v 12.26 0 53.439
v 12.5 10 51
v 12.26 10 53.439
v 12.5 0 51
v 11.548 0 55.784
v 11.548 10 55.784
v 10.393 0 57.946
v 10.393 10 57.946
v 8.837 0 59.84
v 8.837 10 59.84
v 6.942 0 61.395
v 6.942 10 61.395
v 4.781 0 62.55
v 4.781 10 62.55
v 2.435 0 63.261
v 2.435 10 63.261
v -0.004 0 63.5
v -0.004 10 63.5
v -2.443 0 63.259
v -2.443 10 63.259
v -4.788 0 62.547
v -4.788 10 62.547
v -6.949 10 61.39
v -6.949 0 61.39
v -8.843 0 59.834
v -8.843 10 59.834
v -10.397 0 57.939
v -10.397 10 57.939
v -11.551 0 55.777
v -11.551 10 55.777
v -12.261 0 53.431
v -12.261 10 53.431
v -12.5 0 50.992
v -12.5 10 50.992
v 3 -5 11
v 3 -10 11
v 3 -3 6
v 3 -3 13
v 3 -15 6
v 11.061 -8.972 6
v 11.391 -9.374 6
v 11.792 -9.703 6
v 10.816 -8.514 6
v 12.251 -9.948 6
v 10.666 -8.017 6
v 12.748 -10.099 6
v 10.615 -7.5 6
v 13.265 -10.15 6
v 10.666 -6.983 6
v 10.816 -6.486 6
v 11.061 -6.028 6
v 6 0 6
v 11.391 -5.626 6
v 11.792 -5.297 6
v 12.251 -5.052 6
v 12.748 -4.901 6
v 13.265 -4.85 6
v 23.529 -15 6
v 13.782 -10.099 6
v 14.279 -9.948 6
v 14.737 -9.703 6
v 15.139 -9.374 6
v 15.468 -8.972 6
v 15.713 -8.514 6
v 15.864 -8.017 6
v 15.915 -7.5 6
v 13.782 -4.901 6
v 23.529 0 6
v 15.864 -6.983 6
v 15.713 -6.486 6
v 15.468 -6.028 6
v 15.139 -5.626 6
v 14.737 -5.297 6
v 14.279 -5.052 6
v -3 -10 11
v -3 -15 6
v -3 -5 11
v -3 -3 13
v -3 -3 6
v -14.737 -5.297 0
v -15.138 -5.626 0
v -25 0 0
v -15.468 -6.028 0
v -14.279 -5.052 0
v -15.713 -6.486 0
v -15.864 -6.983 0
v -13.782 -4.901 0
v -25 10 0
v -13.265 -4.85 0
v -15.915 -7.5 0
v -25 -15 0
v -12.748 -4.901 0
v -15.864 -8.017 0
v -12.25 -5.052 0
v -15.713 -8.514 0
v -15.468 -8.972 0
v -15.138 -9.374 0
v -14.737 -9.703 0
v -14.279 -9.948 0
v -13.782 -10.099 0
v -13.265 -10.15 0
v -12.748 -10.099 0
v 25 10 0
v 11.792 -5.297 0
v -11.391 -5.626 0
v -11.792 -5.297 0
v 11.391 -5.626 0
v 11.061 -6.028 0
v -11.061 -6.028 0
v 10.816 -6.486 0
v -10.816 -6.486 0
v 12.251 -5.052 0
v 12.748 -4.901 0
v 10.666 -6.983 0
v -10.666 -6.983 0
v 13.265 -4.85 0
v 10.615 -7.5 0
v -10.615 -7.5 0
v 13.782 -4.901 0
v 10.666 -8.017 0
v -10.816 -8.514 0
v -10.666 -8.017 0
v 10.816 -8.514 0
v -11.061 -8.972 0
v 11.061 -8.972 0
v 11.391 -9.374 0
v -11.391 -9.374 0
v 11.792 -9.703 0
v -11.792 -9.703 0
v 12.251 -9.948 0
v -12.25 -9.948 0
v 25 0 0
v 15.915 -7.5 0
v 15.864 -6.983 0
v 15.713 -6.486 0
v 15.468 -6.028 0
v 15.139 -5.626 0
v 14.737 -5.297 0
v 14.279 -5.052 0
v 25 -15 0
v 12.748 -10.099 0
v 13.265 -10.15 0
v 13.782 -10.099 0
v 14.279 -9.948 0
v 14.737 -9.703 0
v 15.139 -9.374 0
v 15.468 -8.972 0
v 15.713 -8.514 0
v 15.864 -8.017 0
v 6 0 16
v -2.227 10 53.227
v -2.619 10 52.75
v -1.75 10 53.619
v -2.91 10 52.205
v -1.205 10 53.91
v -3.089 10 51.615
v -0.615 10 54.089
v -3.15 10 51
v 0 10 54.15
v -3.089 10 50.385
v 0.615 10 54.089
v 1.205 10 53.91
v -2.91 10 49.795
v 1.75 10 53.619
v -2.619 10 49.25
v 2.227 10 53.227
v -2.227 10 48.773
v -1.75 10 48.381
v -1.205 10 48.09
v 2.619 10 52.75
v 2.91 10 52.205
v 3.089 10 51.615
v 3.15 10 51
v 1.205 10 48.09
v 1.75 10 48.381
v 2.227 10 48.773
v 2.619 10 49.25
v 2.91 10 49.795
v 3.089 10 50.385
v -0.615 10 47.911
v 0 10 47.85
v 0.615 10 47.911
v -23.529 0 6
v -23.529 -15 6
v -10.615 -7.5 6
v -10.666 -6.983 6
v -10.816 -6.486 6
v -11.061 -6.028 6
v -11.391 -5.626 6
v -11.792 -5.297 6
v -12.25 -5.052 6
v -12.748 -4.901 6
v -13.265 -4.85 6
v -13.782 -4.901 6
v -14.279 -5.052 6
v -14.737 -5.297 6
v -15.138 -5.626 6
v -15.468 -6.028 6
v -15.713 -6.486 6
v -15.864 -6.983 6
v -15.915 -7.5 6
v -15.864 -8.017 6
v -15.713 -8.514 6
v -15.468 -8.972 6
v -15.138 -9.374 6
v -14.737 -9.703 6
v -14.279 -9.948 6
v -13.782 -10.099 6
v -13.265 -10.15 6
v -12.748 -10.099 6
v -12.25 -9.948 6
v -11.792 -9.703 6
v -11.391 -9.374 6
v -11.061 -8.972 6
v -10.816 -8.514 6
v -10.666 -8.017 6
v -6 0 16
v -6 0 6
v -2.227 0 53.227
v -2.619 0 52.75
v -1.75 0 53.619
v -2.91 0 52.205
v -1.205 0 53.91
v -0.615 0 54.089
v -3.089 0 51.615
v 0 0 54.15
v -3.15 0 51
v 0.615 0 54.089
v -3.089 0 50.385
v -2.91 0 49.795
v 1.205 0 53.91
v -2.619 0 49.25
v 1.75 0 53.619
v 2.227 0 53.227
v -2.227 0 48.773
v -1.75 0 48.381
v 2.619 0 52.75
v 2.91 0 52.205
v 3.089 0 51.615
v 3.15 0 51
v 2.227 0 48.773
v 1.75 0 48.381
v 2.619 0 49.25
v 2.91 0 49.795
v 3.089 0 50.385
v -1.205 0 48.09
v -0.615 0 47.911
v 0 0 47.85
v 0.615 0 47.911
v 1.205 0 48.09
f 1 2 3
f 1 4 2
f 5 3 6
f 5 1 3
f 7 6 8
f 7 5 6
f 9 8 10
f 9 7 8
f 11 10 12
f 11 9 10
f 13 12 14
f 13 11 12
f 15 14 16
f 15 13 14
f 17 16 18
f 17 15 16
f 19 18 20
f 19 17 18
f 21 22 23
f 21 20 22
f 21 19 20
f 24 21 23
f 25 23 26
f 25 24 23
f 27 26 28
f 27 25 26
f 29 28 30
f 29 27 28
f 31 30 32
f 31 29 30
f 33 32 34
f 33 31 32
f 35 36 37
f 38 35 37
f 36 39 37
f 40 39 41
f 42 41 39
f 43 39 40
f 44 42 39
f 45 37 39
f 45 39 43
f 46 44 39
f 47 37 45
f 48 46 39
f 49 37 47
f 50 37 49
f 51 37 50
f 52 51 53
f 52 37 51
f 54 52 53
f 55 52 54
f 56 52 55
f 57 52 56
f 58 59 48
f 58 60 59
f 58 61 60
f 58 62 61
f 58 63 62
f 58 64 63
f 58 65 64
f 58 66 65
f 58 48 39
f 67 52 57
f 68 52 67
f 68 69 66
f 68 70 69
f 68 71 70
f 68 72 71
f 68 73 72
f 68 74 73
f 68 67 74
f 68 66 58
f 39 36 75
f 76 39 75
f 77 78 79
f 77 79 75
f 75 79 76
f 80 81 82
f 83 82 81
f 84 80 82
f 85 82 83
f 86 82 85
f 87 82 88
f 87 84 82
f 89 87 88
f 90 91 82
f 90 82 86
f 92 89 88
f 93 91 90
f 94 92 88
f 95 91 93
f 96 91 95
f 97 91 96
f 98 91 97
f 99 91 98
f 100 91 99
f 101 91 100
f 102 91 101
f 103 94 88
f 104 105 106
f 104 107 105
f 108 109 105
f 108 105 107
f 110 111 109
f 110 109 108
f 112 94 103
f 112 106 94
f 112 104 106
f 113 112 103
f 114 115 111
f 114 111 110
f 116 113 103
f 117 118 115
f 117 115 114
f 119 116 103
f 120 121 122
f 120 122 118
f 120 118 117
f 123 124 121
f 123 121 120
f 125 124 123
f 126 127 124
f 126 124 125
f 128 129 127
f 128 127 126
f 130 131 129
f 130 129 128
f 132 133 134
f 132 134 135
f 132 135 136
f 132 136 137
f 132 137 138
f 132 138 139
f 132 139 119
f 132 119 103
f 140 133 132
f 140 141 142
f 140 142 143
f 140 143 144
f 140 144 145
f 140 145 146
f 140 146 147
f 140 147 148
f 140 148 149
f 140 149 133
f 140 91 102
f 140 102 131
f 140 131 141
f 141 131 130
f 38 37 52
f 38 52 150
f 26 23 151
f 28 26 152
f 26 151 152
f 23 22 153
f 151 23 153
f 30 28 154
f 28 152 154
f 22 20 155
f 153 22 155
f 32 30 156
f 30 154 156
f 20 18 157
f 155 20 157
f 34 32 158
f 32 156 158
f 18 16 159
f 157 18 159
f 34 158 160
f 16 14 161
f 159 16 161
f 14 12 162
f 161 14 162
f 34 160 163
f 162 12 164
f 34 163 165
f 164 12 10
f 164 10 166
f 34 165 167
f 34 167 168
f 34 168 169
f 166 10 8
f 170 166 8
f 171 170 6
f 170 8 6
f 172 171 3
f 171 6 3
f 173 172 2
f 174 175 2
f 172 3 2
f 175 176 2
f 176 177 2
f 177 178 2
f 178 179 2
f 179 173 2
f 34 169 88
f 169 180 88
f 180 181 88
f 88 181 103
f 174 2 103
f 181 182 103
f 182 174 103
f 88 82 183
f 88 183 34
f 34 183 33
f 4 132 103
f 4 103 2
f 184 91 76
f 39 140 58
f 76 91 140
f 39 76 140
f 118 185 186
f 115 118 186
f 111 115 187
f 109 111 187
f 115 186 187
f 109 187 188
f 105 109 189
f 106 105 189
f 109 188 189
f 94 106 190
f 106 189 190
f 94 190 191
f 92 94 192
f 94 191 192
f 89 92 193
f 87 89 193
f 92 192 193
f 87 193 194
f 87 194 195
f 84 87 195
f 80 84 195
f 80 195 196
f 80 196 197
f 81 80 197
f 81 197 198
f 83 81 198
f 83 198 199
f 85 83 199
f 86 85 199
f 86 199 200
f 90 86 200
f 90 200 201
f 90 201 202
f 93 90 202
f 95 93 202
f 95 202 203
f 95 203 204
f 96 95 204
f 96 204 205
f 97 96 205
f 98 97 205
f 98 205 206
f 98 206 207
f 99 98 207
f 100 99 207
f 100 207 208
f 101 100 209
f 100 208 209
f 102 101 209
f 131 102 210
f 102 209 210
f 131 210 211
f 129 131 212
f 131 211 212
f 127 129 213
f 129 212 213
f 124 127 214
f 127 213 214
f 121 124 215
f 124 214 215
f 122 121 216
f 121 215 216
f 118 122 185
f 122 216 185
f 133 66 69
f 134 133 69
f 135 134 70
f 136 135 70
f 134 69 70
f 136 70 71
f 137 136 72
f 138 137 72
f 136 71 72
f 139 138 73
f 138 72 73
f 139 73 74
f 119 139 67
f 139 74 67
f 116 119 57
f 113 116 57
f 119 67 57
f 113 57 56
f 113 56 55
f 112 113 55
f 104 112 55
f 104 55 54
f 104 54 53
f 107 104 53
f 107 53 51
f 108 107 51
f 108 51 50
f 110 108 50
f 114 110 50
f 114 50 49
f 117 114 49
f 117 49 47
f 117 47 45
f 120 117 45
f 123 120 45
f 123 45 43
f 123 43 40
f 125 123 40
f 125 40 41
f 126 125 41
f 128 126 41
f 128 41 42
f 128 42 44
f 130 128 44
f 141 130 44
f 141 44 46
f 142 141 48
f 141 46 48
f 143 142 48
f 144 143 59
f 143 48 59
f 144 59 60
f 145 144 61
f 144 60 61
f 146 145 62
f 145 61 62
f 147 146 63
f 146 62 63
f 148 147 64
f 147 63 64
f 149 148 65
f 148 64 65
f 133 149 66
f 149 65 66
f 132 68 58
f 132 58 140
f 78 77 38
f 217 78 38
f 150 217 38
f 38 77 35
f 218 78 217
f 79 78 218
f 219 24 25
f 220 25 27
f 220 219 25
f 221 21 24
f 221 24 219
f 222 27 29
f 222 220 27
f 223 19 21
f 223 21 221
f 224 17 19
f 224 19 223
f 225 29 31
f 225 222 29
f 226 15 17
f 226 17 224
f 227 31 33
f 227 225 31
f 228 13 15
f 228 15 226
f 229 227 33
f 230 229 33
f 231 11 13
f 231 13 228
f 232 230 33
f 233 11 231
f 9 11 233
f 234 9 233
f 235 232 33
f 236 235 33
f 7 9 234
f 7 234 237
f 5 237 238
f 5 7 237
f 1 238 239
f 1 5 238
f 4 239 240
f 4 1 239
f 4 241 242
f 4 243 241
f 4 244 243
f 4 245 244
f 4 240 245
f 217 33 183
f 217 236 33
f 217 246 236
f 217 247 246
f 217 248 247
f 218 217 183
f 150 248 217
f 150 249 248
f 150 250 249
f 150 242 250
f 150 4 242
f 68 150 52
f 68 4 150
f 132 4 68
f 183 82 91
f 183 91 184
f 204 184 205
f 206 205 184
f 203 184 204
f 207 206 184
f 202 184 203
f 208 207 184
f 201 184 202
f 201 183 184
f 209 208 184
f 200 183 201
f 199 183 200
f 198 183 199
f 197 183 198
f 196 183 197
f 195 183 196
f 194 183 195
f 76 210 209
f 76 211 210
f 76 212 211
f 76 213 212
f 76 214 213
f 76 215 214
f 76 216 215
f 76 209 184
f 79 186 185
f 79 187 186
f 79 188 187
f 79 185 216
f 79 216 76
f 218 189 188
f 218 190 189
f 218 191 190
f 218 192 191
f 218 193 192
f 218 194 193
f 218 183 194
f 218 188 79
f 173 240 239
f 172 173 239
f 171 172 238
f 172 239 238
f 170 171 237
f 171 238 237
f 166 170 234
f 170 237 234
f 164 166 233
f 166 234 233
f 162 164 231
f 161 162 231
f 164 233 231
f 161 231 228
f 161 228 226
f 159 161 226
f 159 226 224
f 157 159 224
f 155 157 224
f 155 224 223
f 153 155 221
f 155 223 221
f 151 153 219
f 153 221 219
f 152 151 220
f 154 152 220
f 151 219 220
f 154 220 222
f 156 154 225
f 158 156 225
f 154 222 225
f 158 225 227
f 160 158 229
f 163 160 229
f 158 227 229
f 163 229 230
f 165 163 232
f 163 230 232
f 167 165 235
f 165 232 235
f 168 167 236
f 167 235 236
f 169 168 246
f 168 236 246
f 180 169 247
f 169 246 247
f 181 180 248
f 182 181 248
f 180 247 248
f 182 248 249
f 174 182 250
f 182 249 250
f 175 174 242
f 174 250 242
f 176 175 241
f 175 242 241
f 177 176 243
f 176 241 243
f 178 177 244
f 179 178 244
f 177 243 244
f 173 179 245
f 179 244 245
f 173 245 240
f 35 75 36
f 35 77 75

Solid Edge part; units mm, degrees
sketch "Sketch1" plane through (0, 0, 0) normal (0, -1, 0) x (1, 0, 0)
  circle A0 centre (0, 51) radius 3.15
  line L0 (25, 0) -> (12.5, 51)
  line L1 (0, 0) -> (25, 0)
  line L2 (0, 0) -> (-25, 0)
  line L3 (-25, 0) -> (-12.5, 50.9918)
  arc A1 (-12.5, 50.9918) -> (12.5, 51) centre (0, 51) cw
extrude "Protrusion1" add sketch "Sketch1" against normal blind 10
sketch "Sketch2" plane through (0, 0, 31.75) normal (0, -1, 0) x (1, 0, 0)
  line L0 (0, -25.75) -> (23.5294, -25.75)
  line L1 (23.5294, -25.75) -> (25, -31.75)
  line L2 (25, -31.75) -> (-25, -31.75)
  line L3 (-25, -31.75) -> (-23.5292, -25.75)
  line L4 (-23.5292, -25.75) -> (0, -25.75)
extrude "ExtrudedProtrusion_3" add sketch "Sketch2" along normal blind 15
sketch "Sketch3" plane through (0.0001, -7.5, 6) normal (0, 0, 1) x (1, 0, 0)
  line L0 (2.9999, -7.5) -> (2.9999, 7.5)
  line L1 (2.9999, 7.5) -> (-3.0001, 7.5)
  line L2 (-3.0001, 7.5) -> (-3.0001, -7.5)
  line L3 (-3.0001, -7.5) -> (2.9999, -7.5)
extrude "ExtrudedProtrusion_4" add sketch "Sketch3" along normal blind 5
chamfer "Chamfer_1" distance 5 angle 45 2 edges at (0, 0, 11) (0, -15, 11)
chamfer "Chamfer_2" distance 3 angle 45 2 edges at (3, 0, 11) (-3, 0, 11)
sketch "Sketch4" plane through (-13.2646, -7.5, 6) normal (0, 0, 1) x (1, 0, 0)
  circle A0 centre (26.5293, 0) radius 2.65
  circle A1 centre (0, 0) radius 2.65
  dimension "D1" = 5.3
  dimension "D2" = 5.3
extrude "Cutout1" cut sketch "Sketch4" against normal up to next
